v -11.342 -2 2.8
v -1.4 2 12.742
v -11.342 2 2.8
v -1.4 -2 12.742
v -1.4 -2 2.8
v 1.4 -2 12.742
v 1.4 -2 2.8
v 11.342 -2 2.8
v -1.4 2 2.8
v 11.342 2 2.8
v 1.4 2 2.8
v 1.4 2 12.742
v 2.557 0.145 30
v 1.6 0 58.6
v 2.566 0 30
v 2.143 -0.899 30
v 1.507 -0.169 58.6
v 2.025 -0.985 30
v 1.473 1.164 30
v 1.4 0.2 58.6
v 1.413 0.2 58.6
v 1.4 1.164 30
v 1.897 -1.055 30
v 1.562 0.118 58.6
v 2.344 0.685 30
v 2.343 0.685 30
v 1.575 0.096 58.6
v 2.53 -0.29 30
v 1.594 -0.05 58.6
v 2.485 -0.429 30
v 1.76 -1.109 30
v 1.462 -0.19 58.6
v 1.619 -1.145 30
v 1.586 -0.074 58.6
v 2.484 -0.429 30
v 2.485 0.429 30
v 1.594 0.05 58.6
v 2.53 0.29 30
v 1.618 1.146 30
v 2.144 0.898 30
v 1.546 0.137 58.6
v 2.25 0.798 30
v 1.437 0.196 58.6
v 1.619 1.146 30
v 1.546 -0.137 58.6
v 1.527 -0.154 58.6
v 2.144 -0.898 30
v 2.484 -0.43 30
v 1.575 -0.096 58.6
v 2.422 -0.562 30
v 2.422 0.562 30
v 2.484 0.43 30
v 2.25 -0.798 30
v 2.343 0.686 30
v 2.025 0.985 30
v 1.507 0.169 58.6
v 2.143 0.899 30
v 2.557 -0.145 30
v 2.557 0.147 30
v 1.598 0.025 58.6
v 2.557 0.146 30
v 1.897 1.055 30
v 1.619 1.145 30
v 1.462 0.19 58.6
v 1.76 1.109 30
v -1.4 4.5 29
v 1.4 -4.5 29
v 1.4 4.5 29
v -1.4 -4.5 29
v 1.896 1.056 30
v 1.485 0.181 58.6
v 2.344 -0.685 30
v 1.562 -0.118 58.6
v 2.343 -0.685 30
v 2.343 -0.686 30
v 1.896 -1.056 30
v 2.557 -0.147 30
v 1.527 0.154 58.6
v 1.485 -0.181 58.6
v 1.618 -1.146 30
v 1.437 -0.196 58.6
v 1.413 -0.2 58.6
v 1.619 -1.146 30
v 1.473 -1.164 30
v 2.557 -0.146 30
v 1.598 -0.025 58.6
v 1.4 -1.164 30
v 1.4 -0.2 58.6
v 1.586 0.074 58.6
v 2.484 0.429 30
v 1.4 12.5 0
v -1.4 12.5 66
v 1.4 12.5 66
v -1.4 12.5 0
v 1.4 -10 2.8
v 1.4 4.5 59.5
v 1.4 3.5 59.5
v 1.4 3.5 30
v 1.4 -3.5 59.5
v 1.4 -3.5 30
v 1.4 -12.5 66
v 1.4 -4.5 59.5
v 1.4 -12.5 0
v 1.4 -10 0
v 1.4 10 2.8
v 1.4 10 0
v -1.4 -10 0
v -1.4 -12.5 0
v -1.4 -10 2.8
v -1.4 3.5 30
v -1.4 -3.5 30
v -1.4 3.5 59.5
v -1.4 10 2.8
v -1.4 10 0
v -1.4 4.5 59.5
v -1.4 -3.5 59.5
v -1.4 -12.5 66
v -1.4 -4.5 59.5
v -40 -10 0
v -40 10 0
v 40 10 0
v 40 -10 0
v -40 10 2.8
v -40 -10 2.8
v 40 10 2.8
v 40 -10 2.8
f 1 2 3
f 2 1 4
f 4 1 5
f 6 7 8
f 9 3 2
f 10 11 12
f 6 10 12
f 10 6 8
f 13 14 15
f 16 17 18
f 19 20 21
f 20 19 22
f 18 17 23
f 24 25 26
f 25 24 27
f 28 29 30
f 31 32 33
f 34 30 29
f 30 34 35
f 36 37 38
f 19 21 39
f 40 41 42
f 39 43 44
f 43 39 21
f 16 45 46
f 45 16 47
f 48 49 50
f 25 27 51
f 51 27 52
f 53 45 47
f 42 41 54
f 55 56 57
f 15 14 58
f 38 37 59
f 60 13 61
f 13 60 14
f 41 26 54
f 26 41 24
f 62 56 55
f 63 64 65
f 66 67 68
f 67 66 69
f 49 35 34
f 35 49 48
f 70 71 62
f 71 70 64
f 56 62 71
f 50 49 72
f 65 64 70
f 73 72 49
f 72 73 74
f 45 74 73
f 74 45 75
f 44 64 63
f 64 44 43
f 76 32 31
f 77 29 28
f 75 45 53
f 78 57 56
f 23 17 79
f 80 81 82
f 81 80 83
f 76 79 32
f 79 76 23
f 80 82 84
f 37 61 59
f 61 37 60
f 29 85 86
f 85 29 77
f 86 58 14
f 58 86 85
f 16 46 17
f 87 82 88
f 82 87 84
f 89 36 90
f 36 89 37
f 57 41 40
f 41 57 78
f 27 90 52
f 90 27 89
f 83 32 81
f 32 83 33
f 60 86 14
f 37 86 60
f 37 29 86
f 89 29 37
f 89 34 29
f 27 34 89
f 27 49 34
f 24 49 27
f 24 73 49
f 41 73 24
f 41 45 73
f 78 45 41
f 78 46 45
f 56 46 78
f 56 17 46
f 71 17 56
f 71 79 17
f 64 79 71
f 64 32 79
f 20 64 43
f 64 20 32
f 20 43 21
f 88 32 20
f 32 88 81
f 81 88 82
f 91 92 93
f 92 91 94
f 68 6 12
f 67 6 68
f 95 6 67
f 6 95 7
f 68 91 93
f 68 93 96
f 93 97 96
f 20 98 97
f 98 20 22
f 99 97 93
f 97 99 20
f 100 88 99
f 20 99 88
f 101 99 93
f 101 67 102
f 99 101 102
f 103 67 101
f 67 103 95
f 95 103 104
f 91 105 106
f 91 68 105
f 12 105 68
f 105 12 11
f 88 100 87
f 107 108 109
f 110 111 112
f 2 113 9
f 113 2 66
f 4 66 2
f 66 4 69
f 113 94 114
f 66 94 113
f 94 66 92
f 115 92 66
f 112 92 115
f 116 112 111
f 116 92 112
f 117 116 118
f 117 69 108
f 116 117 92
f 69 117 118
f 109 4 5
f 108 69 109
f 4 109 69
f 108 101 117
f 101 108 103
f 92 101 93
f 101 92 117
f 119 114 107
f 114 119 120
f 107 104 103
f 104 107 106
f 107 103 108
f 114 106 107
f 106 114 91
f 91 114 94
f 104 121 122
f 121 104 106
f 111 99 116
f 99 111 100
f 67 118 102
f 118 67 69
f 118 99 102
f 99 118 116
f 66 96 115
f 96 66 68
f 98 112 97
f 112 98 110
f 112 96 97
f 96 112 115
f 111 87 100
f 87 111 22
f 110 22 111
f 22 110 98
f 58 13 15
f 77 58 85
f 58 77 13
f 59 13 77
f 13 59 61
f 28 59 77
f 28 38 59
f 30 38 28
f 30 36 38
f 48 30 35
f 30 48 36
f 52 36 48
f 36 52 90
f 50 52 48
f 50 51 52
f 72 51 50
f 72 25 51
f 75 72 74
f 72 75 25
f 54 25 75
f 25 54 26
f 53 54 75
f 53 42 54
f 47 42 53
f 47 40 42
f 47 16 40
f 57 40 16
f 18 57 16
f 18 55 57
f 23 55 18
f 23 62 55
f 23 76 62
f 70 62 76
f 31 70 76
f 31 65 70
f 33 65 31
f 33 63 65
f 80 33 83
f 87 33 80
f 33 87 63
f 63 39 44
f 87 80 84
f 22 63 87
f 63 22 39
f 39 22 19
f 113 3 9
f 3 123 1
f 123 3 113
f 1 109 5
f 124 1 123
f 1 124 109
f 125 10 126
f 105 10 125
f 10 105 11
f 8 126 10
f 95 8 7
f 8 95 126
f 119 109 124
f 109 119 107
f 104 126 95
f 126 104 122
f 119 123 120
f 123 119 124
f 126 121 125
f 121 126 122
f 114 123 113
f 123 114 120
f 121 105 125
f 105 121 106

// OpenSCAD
/*

*/
drzak_A();

module pruzny_klip(){

}
module uchyt_repra(delka_rovneho_segmentu=20, delka_sikmeho_segmentu=37,sirka=25,tloustka=2.8){
    //delka_rovneho_segmentu=20;
    //delka_sikmeho_segmentu=37;
    //sirka=25;
    //tloustka=2.8;
    color ("Green")translate ([1,0,0]) rotate ([0,0,0]){  }//klip
    
    
    translate([0,0,-0.5*(-delka_rovneho_segmentu+delka_sikmeho_segmentu)]){
        
        difference(){//stojan - klip
            
            union(){
            color ("Khaki")translate ([0.5*tloustka,0,0]) rotate ([0,0,0]) cylinder(h=0.8*delka_sikmeho_segmentu, r1=1.2,r2=0.2, $fn=50);
            color ("Yellow")translate ([0,0,delka_sikmeho_segmentu*0.5]) rotate ([90,0,90]) cube([sirka,delka_sikmeho_segmentu,tloustka], center=true);    
            color ("Gold")translate ([0,0,-0.5*delka_rovneho_segmentu]) rotate ([90,0,90]) cube([sirka,delka_rovneho_segmentu,tloustka], center=true);
        }//union
        
            union(){
            color ("LightGreen")translate ([0,-4,-3+delka_sikmeho_segmentu*0.5]) rotate ([90,0,90]) cube([1,30,2*tloustka], center=true);
            color ("LightGreen")translate ([0,+4,-3+delka_sikmeho_segmentu*0.5]) rotate ([90,0,90]) cube([1,30,2*tloustka], center=true);
            color ("LightGreen")translate ([0,-0,-18+delka_sikmeho_segmentu*0.5]) rotate ([90,90,90]) cube([1,9,2*tloustka], center=true);
        }//diry pro klip
        
        }//difference
        }//center translate
    
}//module

module drzak_A(){
    
    uchyt_delka_rovneho_segmentu=29;
    uchyt_delka_sikmeho_segmentu=37;
    uchyt_sirka=25;
    uchyt_tloustka=2.8;

    //podpera
    difference(){
    color ("green") translate([0,0,0]) rotate([90,45,0]) cube([20,20,4], center=true);
    color("grey")  translate([0,0,-8-0.5*uchyt_tloustka]) rotate([0,0,0]) cube([30,30,20], center=true);
    }
    
    //to co se bude lepit ke stolu
    translate([0,0,uchyt_tloustka*0.5]) rotate([0,0,90]) cube([/*uchyt_sirka*/20,80,uchyt_tloustka], center=true);
    
    //samotna uchytka
    translate([0,0,0.5*uchyt_delka_rovneho_segmentu+0.5*uchyt_delka_sikmeho_segmentu])
        uchyt_repra(delka_rovneho_segmentu=uchyt_delka_rovneho_segmentu,
        delka_sikmeho_segmentu=uchyt_delka_sikmeho_segmentu,
        sirka=uchyt_sirka,
        tloustka=uchyt_tloustka);
    
    
    }




module drzak_B(){
    
    
    
    }
